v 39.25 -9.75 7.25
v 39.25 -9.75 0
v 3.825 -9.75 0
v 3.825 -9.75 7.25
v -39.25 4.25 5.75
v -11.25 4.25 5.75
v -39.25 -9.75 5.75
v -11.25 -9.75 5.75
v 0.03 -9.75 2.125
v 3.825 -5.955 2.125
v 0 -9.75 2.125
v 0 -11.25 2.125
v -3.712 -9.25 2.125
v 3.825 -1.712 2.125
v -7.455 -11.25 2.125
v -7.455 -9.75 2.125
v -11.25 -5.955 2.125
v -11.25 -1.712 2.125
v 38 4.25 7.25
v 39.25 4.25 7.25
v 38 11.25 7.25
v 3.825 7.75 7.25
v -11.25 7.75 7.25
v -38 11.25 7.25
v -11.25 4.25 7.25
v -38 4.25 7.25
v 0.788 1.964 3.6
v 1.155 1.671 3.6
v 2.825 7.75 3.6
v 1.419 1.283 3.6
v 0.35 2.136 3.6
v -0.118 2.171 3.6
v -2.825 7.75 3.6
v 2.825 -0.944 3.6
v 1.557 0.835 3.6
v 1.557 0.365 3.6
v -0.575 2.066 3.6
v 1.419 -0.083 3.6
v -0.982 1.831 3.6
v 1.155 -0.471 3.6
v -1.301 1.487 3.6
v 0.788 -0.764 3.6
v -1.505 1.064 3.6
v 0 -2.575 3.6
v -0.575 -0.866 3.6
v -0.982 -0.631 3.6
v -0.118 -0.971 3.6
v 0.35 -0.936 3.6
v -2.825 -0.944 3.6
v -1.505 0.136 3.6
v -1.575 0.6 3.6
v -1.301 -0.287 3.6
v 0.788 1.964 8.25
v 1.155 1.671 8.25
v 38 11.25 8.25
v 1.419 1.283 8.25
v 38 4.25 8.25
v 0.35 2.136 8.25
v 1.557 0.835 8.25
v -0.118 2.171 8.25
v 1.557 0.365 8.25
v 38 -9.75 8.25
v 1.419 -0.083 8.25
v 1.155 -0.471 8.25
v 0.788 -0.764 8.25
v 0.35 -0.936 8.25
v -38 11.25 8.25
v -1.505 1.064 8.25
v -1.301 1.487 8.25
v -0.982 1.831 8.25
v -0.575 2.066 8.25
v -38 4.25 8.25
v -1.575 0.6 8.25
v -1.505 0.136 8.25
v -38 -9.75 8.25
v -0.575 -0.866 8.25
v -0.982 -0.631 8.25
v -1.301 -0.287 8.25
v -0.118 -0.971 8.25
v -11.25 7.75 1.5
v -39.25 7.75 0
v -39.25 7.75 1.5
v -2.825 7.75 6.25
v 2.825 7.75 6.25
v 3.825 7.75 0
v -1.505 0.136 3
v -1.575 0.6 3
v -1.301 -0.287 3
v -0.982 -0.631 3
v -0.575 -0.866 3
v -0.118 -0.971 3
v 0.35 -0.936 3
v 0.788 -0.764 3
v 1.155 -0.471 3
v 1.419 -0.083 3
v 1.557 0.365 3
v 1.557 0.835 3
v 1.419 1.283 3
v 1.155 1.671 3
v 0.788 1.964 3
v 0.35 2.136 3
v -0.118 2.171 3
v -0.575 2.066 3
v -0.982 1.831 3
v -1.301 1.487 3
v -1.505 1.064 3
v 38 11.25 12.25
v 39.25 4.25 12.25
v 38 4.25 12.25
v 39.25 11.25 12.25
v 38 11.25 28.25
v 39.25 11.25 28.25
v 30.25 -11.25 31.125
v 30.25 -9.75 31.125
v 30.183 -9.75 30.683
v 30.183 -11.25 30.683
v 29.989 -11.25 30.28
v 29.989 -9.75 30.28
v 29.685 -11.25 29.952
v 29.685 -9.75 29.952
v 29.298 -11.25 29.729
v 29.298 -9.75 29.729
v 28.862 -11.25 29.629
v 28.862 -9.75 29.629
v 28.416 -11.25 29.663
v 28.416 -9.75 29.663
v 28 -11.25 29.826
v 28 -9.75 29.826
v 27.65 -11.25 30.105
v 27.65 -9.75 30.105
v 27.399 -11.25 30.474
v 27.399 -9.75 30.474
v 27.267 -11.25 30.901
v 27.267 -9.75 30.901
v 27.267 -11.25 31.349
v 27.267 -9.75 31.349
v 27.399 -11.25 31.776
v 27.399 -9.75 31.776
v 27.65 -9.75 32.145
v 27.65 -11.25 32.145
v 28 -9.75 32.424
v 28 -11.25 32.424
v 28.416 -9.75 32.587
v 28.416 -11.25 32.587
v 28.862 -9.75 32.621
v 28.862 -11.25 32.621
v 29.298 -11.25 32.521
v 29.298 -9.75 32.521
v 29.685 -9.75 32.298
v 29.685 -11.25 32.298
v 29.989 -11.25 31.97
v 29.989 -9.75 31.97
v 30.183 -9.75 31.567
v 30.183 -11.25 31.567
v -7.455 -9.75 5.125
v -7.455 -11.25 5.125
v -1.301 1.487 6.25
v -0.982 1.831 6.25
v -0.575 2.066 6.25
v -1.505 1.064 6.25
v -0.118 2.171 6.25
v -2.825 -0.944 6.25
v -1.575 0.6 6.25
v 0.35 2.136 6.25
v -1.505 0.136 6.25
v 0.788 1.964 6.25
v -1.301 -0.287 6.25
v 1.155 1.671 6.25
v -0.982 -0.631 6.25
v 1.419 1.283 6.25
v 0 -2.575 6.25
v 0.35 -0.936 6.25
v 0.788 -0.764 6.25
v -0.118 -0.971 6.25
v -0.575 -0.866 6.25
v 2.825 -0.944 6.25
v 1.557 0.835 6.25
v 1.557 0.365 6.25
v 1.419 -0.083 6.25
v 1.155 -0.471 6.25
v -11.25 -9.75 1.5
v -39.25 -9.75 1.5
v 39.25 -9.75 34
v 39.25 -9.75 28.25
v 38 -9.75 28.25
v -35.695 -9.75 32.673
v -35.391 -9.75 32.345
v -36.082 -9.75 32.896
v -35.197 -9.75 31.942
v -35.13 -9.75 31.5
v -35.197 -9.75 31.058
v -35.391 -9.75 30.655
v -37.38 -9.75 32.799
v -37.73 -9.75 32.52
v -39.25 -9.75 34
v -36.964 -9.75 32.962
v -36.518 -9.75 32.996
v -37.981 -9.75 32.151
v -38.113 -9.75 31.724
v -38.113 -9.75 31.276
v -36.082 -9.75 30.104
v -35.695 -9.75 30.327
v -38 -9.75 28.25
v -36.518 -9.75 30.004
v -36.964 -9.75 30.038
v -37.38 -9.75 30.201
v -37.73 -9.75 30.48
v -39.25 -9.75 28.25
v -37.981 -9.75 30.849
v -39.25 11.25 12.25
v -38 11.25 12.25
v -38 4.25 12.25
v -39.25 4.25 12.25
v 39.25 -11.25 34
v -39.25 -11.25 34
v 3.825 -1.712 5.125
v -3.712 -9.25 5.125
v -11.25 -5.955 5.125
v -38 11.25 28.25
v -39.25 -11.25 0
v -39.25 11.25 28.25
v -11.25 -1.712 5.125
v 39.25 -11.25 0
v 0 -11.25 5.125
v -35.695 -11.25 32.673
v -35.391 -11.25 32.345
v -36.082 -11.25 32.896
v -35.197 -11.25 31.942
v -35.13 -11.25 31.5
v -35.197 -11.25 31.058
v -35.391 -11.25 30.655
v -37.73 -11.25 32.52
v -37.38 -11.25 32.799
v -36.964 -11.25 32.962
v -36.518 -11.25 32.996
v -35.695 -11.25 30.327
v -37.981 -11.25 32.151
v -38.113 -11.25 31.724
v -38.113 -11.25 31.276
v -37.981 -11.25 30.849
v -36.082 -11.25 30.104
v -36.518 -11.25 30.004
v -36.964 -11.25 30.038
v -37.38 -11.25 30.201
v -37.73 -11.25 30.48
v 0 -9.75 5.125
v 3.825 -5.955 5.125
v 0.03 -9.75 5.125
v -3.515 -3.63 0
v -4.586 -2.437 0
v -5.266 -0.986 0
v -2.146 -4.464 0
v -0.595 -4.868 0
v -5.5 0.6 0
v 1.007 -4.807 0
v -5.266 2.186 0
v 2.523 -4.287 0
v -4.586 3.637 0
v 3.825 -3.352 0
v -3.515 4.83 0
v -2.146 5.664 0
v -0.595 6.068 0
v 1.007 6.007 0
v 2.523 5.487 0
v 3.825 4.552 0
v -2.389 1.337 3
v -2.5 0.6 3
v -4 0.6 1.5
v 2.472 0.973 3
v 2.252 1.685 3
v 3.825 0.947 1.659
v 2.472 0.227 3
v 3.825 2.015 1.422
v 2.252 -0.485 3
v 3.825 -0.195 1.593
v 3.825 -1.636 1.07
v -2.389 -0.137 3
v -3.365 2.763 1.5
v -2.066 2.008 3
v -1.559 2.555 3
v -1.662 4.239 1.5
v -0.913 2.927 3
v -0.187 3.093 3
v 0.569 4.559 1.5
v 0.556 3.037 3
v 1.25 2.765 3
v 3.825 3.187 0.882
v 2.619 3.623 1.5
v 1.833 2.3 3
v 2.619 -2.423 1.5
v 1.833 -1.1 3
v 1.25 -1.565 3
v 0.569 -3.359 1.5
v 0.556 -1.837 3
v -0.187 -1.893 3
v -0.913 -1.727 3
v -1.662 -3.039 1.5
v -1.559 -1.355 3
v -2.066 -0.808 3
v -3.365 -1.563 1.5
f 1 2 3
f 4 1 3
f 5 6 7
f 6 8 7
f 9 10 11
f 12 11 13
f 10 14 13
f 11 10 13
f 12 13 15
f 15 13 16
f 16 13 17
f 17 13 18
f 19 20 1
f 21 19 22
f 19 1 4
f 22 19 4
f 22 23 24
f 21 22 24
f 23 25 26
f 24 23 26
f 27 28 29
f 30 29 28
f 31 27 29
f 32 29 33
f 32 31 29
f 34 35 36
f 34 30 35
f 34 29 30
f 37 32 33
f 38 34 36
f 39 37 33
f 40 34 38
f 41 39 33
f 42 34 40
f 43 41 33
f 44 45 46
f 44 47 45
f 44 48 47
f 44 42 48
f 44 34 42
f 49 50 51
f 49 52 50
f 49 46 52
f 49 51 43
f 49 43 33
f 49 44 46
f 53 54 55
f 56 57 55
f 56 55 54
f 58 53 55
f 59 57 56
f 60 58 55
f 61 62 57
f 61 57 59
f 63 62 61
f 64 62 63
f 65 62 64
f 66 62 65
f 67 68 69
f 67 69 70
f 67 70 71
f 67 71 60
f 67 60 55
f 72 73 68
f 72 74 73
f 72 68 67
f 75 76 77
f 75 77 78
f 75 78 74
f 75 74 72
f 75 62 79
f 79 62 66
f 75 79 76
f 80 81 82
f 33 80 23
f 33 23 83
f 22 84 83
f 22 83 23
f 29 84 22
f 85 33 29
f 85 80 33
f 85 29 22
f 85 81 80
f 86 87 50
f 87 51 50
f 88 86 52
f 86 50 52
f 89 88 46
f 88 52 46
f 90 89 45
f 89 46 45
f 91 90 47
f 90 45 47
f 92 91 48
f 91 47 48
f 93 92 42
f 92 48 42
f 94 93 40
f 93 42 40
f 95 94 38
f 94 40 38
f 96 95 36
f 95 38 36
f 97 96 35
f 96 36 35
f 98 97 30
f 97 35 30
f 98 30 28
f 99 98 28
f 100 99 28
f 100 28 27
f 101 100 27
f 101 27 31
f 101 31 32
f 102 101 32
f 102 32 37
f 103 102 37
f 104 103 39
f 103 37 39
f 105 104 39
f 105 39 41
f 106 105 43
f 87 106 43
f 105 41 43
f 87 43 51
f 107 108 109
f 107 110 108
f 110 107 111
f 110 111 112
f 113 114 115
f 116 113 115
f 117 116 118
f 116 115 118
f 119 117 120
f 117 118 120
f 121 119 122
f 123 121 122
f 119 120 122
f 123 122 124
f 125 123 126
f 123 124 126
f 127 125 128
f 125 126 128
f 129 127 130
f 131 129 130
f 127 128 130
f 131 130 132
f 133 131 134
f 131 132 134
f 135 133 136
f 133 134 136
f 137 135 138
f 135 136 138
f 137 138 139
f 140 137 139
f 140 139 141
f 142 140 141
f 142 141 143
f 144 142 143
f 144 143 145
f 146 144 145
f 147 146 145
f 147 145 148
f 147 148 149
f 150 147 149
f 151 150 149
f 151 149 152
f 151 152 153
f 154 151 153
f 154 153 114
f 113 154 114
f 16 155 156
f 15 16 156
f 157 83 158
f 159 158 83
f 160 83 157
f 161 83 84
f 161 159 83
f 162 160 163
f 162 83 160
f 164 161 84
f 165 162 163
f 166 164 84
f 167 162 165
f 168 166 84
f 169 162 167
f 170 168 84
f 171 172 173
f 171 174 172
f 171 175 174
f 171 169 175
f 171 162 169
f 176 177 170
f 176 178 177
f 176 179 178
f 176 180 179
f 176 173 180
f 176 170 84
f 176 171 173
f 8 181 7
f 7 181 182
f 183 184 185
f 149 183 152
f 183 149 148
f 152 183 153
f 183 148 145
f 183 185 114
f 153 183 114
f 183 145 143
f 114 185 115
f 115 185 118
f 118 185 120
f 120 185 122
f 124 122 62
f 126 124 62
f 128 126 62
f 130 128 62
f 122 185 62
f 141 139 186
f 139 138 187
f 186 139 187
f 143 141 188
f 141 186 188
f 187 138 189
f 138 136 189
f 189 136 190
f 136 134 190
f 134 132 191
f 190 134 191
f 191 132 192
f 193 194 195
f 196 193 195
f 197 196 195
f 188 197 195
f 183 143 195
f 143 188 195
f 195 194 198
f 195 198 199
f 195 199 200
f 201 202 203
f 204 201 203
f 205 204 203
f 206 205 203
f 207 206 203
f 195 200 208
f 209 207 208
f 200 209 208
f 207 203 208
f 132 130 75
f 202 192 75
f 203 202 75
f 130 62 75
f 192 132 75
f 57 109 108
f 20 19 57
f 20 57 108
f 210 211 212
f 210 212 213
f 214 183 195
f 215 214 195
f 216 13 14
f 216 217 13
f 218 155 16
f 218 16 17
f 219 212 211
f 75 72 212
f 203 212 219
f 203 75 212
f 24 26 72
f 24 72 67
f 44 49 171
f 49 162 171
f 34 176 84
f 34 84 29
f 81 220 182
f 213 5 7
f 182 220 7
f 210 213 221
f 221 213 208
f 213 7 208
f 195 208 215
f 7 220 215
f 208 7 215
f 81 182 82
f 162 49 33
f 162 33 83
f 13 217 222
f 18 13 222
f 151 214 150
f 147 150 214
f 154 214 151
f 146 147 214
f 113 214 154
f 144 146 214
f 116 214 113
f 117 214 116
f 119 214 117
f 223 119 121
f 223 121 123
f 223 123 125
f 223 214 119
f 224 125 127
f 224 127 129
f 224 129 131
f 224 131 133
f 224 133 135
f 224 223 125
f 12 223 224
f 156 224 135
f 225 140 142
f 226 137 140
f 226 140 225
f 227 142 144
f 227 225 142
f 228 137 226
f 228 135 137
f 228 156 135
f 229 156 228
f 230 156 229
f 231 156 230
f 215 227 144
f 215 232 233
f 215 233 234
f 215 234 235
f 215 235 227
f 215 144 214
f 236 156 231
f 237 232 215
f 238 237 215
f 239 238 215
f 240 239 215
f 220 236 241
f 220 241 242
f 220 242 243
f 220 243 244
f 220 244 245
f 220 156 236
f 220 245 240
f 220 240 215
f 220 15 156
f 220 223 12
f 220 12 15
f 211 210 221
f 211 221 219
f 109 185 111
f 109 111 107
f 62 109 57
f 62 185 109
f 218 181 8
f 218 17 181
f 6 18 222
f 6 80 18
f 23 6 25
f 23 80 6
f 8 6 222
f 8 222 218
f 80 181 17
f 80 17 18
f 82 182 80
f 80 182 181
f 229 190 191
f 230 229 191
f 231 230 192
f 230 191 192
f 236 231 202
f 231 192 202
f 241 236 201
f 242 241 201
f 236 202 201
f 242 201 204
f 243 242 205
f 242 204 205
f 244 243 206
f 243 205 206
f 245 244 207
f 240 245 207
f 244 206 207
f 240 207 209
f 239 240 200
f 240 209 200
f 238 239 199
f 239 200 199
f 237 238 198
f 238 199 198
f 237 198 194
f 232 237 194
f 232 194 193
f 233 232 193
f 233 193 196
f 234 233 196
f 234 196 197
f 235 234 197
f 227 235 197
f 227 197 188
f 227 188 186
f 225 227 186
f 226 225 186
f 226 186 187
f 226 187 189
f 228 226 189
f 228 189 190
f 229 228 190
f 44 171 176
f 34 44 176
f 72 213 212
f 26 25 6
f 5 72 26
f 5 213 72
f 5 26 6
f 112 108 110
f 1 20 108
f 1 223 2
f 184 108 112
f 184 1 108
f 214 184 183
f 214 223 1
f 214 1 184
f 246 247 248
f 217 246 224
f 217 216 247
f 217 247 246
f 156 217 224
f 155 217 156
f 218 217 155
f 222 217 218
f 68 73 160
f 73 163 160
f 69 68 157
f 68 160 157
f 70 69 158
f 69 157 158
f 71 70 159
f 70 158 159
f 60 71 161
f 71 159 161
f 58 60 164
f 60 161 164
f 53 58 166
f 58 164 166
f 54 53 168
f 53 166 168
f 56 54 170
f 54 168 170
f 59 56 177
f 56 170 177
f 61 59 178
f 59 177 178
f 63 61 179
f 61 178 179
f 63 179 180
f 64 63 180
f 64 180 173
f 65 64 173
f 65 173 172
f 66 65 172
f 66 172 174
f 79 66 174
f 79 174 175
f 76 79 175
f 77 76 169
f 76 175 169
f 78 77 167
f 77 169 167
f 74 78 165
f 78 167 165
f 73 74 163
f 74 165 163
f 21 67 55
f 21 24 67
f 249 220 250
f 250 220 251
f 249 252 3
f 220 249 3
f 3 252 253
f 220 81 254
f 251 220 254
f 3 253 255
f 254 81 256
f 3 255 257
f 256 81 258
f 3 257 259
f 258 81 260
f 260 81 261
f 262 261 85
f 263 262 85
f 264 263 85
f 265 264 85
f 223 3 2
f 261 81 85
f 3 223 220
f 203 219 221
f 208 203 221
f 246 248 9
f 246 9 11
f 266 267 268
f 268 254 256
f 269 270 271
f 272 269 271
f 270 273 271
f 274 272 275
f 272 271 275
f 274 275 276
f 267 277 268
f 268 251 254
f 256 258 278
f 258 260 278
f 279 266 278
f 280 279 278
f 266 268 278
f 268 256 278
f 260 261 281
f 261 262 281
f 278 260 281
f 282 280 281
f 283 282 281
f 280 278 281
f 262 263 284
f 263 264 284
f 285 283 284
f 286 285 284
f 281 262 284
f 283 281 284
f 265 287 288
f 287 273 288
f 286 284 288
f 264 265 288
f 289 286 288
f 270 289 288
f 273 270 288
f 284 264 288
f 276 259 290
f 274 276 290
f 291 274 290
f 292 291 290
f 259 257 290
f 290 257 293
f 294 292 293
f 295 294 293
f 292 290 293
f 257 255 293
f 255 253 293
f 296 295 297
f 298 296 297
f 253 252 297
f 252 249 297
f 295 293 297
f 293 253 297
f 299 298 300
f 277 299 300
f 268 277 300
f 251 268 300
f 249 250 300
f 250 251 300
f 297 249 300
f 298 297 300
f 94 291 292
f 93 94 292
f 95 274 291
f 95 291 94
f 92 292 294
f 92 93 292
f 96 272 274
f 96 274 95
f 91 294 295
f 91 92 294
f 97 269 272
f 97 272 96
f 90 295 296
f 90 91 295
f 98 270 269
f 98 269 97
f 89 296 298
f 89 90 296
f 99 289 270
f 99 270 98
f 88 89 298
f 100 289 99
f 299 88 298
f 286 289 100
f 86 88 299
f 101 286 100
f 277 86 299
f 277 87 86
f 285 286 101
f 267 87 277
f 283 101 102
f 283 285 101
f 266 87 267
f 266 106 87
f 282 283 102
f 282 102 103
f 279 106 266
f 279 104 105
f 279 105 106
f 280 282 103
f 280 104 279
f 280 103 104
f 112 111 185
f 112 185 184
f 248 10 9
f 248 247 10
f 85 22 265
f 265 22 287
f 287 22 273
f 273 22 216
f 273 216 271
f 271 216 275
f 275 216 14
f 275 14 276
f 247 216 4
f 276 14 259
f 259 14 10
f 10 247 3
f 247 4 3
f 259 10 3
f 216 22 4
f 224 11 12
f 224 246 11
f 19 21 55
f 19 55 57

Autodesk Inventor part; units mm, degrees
ref_plane "YZ Plane" through (0, 0, 0) normal (1, 0, 0) x (0, 1, 0)
ref_plane "XZ Plane" through (0, 0, 0) normal (0, 1, 0) x (-1, 0, 0)
sketch "Sketch1" plane through (0, 0, 0) normal (0, 0, 1) x (1, 0, 0)
  line L0 (-39.25, 11.25) -> (39.25, 11.25)
  line L1 (39.25, 11.25) -> (39.25, -11.25)
  line L2 (39.25, -11.25) -> (-39.25, -11.25)
  line L3 (-39.25, -11.25) -> (-39.25, 11.25)
  line L4 (-39.25, -11.25) -> (39.25, -11.25)
  line L5 (39.25, -11.25) -> (39.25, -9.75)
  line L6 (39.25, -9.75) -> (-39.25, -9.75)
  line L7 (-39.25, -9.75) -> (-39.25, -11.25)
  point P0 (0, 0)
  point P1 (0, 11.25)
  point P2 (39.25, 0)
  point P3 (-39.25, -9.75)
  dimension "d0" = 22.5
  dimension "d1" = 78.5
  dimension "d2" = 1.5
extrude "Extrusion1" add sketch "Sketch1" along normal blind 33 contours L6 L1 L2 L3
sketch "Sketch2" plane through (-39.25, -9.75, 0) normal (0, 1, 0) x (1, 0, 0)
  line L0 (0, -1.5) -> (28, -1.5)
  line L1 (28, -1.5) -> (28, -5.75)
  line L2 (28, -5.75) -> (0, -5.75)
  line L3 (0, -5.75) -> (0, -1.5)
  line L4 (0, 0) -> (0, -33) projected
  line L5 (78.5, 0) -> (0, 0) projected
  line L6 (0, -5.75) -> (29.5, -5.75)
  line L7 (29.5, -5.75) -> (29.5, -7.25)
  line L8 (29.5, -7.25) -> (0, -7.25)
  line L9 (0, -7.25) -> (0, -5.75)
  line L10 (0, 0) -> (78.5, 0) projected
  line L11 (29.5, -7.25) -> (28, -7.25)
  line L12 (28, -7.25) -> (28, 0)
  line L13 (28, 0) -> (29.5, 0)
  line L14 (29.5, 0) -> (29.5, -7.25)
  line L15 (0, -33) -> (78.5, -33) projected
  line L16 (1.25, -33) -> (77.25, -33)
  line L17 (77.25, -28.25) -> (77.25, -8.25)
  line L18 (77.25, -8.25) -> (1.25, -8.25)
  line L19 (1.25, -8.25) -> (1.25, -28.25)
  line L20 (0, 0) -> (0, -33) projected
  line L21 (0, -7.25) -> (78.5, -7.25)
  line L22 (78.5, 0) -> (78.5, -33) projected
  line L23 (43.075, -2.6) -> (35.425, -2.6)
  line L24 (35.425, -2.6) -> (35.425, -7.25)
  line L25 (35.425, -7.25) -> (43.075, -7.25)
  line L26 (43.075, -7.25) -> (43.075, -2.6)
  line L27 (42.075, -3.6) -> (36.425, -3.6)
  line L28 (36.425, -3.6) -> (36.425, -6.25)
  line L29 (36.425, -6.25) -> (42.075, -6.25)
  line L30 (42.075, -6.25) -> (42.075, -3.6)
  line L31 (29.5, -7.25) -> (35.425, -7.25)
  line L32 (43.075, -2.6) -> (43.075, 0)
  line L33 (77.25, -28.25) -> (1.25, -28.25)
  line L34 (77.25, -28.25) -> (78.5, -28.25)
  line L35 (1.25, -28.25) -> (0, -28.25)
  line L36 (0, -33) -> (78.5, -33)
  line L37 (78.5, -33) -> (78.5, -34)
  line L38 (78.5, -34) -> (0, -34)
  line L39 (0, -34) -> (0, -33)
  point P0 (39.25, 0)
  point P1 (39.25, -8.25)
  point P2 (39.25, 0)
  point P3 (39.25, -7.25)
  point P4 (39.25, -6.25)
  point P5 (42.075, -4.925)
  point P6 (43.075, -4.925)
  point P7 (0, -1.5)
  point P8 (0, -5.75)
  point P9 (0, -7.25)
  point P10 (0, -7.25)
  dimension "d5" = 28
  dimension "d6" = 4.25
  dimension "d7" = 1.5
  dimension "d8" = 1.5
  dimension "d9" = 1.5
  dimension "d10" = 20
  dimension "d11" = 76
  dimension "d12" = 1
  dimension "d13" = 4.65
  dimension "d14" = 7.65
  dimension "d16" = 2.65
  dimension "d17" = 5.65
  dimension "d52" = 1
extrude "Extrusion2" add sketch "Sketch2" along normal blind 17.5 contours L4 L5 L12 L0 | L12 L5 L14 L6 L1 | L2 L12 L8 L4 | L6 L7 L8 L12
extrude "Extrusion3" add sketch "Sketch2" along normal blind 21 contours L8 L21 L22 L34 L17 L18 L19 L35 L4
extrude "Extrusion4" add sketch "Sketch2" along normal blind 17.5 contours L14 L5 L32 L23 L24 L21 L7 | L24 L23 L26 L21
sketch "Sketch3" plane through (-38, -9.75, 8.25) normal (0, 0, 1) x (1, 0, 0)
  line L0 (75.85, 20.7) -> (0.15, 20.7)
  line L1 (0.15, 20.7) -> (0.15, 0)
  line L2 (0.15, 0) -> (75.85, 0)
  line L3 (75.85, 0) -> (75.85, 20.7)
  line L4 (76, 0) -> (0, 0) projected
  circle A0 centre (38, 10.35) radius 1.575
  line L5 (76, 0) -> (0, 0) projected
  point P0 (38, 9.75)
  point P1 (38, 20.7)
  point P2 (75.85, 10.35)
  dimension "d24" = 75.7
  dimension "d25" = 20.7
  dimension "d28" = 3.15
extrude "Extrusion5" [suppressed]
sketch "Sketch4" plane through (2.825, -9.75, 6.25) normal (0, 0, -1) x (-1, 0, 0)
  line L0 (5.65, 0) -> (0, 0) projected
  line L1 (5.65, 0) -> (5.65, 17.5) projected
  line L2 (0, 17.5) -> (5.65, 17.5) projected
  line L3 (0, 0) -> (0, 17.5) projected
  line L4 (2.825, 7.1746) -> (0, 8.8056)
  line L5 (0.075, 8.7623) -> (0.075, 11.9377)
  line L6 (0.075, 11.9377) -> (2.825, 13.5254)
  line L7 (2.825, 13.5254) -> (5.575, 11.9377)
  line L8 (5.575, 11.9377) -> (5.575, 8.7623)
  line L9 (5.65, 8.8056) -> (2.825, 7.1746)
  circle A0 centre (2.825, 10.35) radius 1.575
  point P0 (2.825, 9.75)
  point P1 (5.575, 10.35)
  point P2 (2.825, 0)
  dimension "d31" = 5.5
  dimension "d34" = 3.15
  dimension "d37" = 10.35
extrude "Extrusion6" add sketch "Sketch4" along normal up to surface (2.65 mm away) contours L0 L3 L4 L9 L1
extrude "Extrusion7" cut sketch "Sketch4" along normal mid plane 10 contours A0
fillet "Fillet1" [suppressed]
sketch "Sketch6" plane through (0, 0, 0) normal (0, 0, -1) x (-1, 0, 0)
  circle A0 centre (0, 0.6) radius 2.5
  line L0 (39.25, -11.25) -> (-39.25, -11.25) projected
  line L1 (39.25, 7.75) -> (39.25, -11.25) projected
  point P0 (0, 0)
  dimension "d43" = 5
  dimension "d44" = 11.85
  dimension "d45" = 39.25
extrude "Extrusion8" cut sketch "Sketch6" against normal blind 3
chamfer "Chamfer1" distance 3 angle 45 1 edges at (2.5, 0.6, 0)
extrude "Extrusion9" add sketch "Sketch2" against normal up to surface (1.5 mm away) contours L15 L37 L38 L39
sketch "Sketch7" plane through (-11.25, -9.75, 1.5) normal (-1, 0, 0) x (0, 0, 1)
  line L0 (0.625, 9) -> (3.625, 9)
  line L1 (3.625, 9) -> (3.625, 4)
  line L2 (3.625, 4) -> (0.625, 4)
  line L3 (0.625, 4) -> (0.625, 9)
  line L4 (4.25, 0) -> (0, 0) projected
  line L5 (0, 0) -> (4.25, 0) projected
  point P0 (-1.5, 9.75)
  point P1 (2.125, 4)
  point P2 (2.125, 0)
  dimension "d55" = 4
  dimension "d56" = 3
  dimension "d57" = 5
sketch "Sketch8" plane through (-39.25, -11.25, 0) normal (0, -1, 0) x (1, 0, 0)
  line L0 (41.75, 2) -> (36.75, 2)
  line L1 (36.75, 2) -> (36.75, 5)
  line L2 (36.75, 5) -> (41.75, 5)
  line L3 (41.75, 5) -> (41.75, 2)
  line L4 (0, 0) -> (78.5, 0) projected
  point P0 (39.25, 0)
  point P1 (39.25, 2)
  point P2 (39.25, 0)
  dimension "d58" = 5
  dimension "d59" = 3
  dimension "d60" = 2
loft "Loft1" [suppressed]
sketch "Sketch9" plane through (39.25, 11.25, 7.25) normal (0, 0, -1) x (-1, 0, 0)
  line L0 (0, -21) -> (0, 0) projected
  line L1 (0, 0) -> (1.25, 0)
  line L2 (1.25, 0) -> (1.25, -7)
  line L3 (1.25, -7) -> (0, -7)
  line L4 (0, -7) -> (0, 0)
  line L5 (0, 0) -> (78.5, 0) projected
  point P0 (39.25, -11.25)
  point P1 (0, -7)
  dimension "d65" = 7
extrude "Extrusion10" cut sketch "Sketch9" against normal blind 5
mirror "Mirror1" about plane through (0, 0, 0) normal (1, 0, 0) of "Extrusion10"
sketch "Sketch10" plane through (-39.25, -11.25, 0) normal (-1, 0, 0) x (0, 0, 1)
  line L0 (12.25, 15.5) -> (7.25, 15.5) projected
  line L1 (1.5, 19) -> (5.75, 19) projected
  line L2 (5.75, 19) -> (7.25, 19)
  line L3 (7.25, 19) -> (7.25, 15.5)
  line L4 (7.25, 15.5) -> (5.75, 15.5)
  line L5 (5.75, 15.5) -> (5.75, 19)
  point P0 (0, 11.25)
extrude "Extrusion11" cut sketch "Sketch10" against normal up to surface (28 mm away)
ref_plane "Work Plane1" through (-11.25, -9.75, 3.625) normal (0, 0, -1) x (-1, 0, 0)
sketch "Sketch11" plane through (-11.25, -9.75, 3.625) normal (0, 0, -1) x (-1, 0, 0)
  line L0 (0, 0) -> (0, 14) projected
  line L1 (0, 17.5) -> (0, 14) projected
  line L2 (0, 0) -> (0, 17.5) projected
  line L3 (-15.075, 0) -> (-15.075, 6.3979) projected
  line L4 (-15.075, 6.3979) -> (-9.6656, 6.3979) construction
  line L5 (-7.5375, 0.5) -> (-16.6978, 9.6603)
  line L6 (-7.5375, 0.5) -> (5.4171, 0.5) construction
  line L7 (-15.075, 17.5) -> (0, 17.5) projected
  line L8 (-7.5375, 0.5) -> (0, 8.0375)
  line L9 (0, 0) -> (0, 14) projected
  line L10 (-7.5375, 0.5) -> (3.1221, 0.5) construction
  line L11 (-18.8191, 7.5389) -> (-7.5375, -3.7426)
  line L12 (-7.5375, -3.7426) -> (2.1213, 5.9162)
  line L13 (-49.25, 0) -> (26.75, 0) projected
  line L14 (0, 3.7949) -> (0, 8.0375)
  line L15 (-15.075, 3.7949) -> (-15.075, 8.0375)
  line L16 (-11.25, 0) -> (-11.25, -1.5)
  line L17 (-3.7949, 0) -> (-3.7949, -1.5)
  line L18 (-11.25, -1.5) -> (-3.7949, -1.5)
  line L19 (-11.25, -1.5) -> (-3.7949, -1.5)
  line L20 (-3.7949, -1.5) -> (-3.7949, -2.3604)
  line L21 (-3.7949, -2.3604) -> (-11.25, -2.3604)
  line L22 (-11.25, -2.3604) -> (-11.25, -1.5)
  line L23 (28, -1.5) -> (-50.5, -1.5) projected
  point P0 (-11.25, 9.75)
  point P1 (-7.5375, 17.5)
  point P2 (0, 3.7949)
  point P3 (0, 8.0375)
  point P4 (-11.2801, 0)
  dimension "d73" = 135
  dimension "d74" = 45
  dimension "d75" = 3
  dimension "d76" = 0.5
extrude "Extrusion12" cut sketch "Sketch11" along normal mid plane 3 contours L12 L13 L11 L3 L15 L5 L8 L0 | L17 L18 L12 | L12 L18 L11 L16 L13 | L18 L20 L21 L12 | L12 L21 L11 L18 | L18 L16 L11 | L11 L21 L22 L18
sketch "Sketch12" plane through (-38, -9.75, 8.25) normal (0, 1, 0) x (1, 0, 0)
  circle A0 centre (1.37, -23.25) radius 1.5
  line L0 (-1.25, -25.75) -> (77.25, -25.75) projected
  line L1 (-1.25, -20) -> (-1.25, -25.75) projected
  circle A1 centre (66.75, -22.875) radius 1.5
  line L2 (77.25, -20) -> (77.25, -25.75) projected
  point P0 (38, 8.25)
  dimension "d79" = 3
  dimension "d80" = 2.5
  dimension "d81" = 2.62
  dimension "d82" = 3
  dimension "d83" = 2.875
  dimension "d84" = 10.5
extrude "Extrusion13" cut sketch "Sketch12" against normal up to surface (1.5 mm away)
sketch "Sketch13" plane through (-38, -9.75, 8.25) normal (0, 1, 0) x (1, 0, 0)
  circle A0 centre (1.37, -23.25) radius 1.5 projected
  circle A1 centre (66.75, -22.875) radius 1.5 projected
  line L0 (77.25, -20) -> (76, -20) projected
  line L1 (76, -20) -> (76, 0) projected
  line L2 (76, 0) -> (0, 0) projected
  line L3 (0, 0) -> (0, -20) projected
  line L4 (0, -20) -> (-1.25, -20) projected
  line L5 (-1.25, -20) -> (-1.25, -25.75) projected
  line L6 (-1.25, -25.75) -> (77.25, -25.75) projected
  line L7 (77.25, -20) -> (77.25, -25.75) projected
  point P0 (38, 8.25)
